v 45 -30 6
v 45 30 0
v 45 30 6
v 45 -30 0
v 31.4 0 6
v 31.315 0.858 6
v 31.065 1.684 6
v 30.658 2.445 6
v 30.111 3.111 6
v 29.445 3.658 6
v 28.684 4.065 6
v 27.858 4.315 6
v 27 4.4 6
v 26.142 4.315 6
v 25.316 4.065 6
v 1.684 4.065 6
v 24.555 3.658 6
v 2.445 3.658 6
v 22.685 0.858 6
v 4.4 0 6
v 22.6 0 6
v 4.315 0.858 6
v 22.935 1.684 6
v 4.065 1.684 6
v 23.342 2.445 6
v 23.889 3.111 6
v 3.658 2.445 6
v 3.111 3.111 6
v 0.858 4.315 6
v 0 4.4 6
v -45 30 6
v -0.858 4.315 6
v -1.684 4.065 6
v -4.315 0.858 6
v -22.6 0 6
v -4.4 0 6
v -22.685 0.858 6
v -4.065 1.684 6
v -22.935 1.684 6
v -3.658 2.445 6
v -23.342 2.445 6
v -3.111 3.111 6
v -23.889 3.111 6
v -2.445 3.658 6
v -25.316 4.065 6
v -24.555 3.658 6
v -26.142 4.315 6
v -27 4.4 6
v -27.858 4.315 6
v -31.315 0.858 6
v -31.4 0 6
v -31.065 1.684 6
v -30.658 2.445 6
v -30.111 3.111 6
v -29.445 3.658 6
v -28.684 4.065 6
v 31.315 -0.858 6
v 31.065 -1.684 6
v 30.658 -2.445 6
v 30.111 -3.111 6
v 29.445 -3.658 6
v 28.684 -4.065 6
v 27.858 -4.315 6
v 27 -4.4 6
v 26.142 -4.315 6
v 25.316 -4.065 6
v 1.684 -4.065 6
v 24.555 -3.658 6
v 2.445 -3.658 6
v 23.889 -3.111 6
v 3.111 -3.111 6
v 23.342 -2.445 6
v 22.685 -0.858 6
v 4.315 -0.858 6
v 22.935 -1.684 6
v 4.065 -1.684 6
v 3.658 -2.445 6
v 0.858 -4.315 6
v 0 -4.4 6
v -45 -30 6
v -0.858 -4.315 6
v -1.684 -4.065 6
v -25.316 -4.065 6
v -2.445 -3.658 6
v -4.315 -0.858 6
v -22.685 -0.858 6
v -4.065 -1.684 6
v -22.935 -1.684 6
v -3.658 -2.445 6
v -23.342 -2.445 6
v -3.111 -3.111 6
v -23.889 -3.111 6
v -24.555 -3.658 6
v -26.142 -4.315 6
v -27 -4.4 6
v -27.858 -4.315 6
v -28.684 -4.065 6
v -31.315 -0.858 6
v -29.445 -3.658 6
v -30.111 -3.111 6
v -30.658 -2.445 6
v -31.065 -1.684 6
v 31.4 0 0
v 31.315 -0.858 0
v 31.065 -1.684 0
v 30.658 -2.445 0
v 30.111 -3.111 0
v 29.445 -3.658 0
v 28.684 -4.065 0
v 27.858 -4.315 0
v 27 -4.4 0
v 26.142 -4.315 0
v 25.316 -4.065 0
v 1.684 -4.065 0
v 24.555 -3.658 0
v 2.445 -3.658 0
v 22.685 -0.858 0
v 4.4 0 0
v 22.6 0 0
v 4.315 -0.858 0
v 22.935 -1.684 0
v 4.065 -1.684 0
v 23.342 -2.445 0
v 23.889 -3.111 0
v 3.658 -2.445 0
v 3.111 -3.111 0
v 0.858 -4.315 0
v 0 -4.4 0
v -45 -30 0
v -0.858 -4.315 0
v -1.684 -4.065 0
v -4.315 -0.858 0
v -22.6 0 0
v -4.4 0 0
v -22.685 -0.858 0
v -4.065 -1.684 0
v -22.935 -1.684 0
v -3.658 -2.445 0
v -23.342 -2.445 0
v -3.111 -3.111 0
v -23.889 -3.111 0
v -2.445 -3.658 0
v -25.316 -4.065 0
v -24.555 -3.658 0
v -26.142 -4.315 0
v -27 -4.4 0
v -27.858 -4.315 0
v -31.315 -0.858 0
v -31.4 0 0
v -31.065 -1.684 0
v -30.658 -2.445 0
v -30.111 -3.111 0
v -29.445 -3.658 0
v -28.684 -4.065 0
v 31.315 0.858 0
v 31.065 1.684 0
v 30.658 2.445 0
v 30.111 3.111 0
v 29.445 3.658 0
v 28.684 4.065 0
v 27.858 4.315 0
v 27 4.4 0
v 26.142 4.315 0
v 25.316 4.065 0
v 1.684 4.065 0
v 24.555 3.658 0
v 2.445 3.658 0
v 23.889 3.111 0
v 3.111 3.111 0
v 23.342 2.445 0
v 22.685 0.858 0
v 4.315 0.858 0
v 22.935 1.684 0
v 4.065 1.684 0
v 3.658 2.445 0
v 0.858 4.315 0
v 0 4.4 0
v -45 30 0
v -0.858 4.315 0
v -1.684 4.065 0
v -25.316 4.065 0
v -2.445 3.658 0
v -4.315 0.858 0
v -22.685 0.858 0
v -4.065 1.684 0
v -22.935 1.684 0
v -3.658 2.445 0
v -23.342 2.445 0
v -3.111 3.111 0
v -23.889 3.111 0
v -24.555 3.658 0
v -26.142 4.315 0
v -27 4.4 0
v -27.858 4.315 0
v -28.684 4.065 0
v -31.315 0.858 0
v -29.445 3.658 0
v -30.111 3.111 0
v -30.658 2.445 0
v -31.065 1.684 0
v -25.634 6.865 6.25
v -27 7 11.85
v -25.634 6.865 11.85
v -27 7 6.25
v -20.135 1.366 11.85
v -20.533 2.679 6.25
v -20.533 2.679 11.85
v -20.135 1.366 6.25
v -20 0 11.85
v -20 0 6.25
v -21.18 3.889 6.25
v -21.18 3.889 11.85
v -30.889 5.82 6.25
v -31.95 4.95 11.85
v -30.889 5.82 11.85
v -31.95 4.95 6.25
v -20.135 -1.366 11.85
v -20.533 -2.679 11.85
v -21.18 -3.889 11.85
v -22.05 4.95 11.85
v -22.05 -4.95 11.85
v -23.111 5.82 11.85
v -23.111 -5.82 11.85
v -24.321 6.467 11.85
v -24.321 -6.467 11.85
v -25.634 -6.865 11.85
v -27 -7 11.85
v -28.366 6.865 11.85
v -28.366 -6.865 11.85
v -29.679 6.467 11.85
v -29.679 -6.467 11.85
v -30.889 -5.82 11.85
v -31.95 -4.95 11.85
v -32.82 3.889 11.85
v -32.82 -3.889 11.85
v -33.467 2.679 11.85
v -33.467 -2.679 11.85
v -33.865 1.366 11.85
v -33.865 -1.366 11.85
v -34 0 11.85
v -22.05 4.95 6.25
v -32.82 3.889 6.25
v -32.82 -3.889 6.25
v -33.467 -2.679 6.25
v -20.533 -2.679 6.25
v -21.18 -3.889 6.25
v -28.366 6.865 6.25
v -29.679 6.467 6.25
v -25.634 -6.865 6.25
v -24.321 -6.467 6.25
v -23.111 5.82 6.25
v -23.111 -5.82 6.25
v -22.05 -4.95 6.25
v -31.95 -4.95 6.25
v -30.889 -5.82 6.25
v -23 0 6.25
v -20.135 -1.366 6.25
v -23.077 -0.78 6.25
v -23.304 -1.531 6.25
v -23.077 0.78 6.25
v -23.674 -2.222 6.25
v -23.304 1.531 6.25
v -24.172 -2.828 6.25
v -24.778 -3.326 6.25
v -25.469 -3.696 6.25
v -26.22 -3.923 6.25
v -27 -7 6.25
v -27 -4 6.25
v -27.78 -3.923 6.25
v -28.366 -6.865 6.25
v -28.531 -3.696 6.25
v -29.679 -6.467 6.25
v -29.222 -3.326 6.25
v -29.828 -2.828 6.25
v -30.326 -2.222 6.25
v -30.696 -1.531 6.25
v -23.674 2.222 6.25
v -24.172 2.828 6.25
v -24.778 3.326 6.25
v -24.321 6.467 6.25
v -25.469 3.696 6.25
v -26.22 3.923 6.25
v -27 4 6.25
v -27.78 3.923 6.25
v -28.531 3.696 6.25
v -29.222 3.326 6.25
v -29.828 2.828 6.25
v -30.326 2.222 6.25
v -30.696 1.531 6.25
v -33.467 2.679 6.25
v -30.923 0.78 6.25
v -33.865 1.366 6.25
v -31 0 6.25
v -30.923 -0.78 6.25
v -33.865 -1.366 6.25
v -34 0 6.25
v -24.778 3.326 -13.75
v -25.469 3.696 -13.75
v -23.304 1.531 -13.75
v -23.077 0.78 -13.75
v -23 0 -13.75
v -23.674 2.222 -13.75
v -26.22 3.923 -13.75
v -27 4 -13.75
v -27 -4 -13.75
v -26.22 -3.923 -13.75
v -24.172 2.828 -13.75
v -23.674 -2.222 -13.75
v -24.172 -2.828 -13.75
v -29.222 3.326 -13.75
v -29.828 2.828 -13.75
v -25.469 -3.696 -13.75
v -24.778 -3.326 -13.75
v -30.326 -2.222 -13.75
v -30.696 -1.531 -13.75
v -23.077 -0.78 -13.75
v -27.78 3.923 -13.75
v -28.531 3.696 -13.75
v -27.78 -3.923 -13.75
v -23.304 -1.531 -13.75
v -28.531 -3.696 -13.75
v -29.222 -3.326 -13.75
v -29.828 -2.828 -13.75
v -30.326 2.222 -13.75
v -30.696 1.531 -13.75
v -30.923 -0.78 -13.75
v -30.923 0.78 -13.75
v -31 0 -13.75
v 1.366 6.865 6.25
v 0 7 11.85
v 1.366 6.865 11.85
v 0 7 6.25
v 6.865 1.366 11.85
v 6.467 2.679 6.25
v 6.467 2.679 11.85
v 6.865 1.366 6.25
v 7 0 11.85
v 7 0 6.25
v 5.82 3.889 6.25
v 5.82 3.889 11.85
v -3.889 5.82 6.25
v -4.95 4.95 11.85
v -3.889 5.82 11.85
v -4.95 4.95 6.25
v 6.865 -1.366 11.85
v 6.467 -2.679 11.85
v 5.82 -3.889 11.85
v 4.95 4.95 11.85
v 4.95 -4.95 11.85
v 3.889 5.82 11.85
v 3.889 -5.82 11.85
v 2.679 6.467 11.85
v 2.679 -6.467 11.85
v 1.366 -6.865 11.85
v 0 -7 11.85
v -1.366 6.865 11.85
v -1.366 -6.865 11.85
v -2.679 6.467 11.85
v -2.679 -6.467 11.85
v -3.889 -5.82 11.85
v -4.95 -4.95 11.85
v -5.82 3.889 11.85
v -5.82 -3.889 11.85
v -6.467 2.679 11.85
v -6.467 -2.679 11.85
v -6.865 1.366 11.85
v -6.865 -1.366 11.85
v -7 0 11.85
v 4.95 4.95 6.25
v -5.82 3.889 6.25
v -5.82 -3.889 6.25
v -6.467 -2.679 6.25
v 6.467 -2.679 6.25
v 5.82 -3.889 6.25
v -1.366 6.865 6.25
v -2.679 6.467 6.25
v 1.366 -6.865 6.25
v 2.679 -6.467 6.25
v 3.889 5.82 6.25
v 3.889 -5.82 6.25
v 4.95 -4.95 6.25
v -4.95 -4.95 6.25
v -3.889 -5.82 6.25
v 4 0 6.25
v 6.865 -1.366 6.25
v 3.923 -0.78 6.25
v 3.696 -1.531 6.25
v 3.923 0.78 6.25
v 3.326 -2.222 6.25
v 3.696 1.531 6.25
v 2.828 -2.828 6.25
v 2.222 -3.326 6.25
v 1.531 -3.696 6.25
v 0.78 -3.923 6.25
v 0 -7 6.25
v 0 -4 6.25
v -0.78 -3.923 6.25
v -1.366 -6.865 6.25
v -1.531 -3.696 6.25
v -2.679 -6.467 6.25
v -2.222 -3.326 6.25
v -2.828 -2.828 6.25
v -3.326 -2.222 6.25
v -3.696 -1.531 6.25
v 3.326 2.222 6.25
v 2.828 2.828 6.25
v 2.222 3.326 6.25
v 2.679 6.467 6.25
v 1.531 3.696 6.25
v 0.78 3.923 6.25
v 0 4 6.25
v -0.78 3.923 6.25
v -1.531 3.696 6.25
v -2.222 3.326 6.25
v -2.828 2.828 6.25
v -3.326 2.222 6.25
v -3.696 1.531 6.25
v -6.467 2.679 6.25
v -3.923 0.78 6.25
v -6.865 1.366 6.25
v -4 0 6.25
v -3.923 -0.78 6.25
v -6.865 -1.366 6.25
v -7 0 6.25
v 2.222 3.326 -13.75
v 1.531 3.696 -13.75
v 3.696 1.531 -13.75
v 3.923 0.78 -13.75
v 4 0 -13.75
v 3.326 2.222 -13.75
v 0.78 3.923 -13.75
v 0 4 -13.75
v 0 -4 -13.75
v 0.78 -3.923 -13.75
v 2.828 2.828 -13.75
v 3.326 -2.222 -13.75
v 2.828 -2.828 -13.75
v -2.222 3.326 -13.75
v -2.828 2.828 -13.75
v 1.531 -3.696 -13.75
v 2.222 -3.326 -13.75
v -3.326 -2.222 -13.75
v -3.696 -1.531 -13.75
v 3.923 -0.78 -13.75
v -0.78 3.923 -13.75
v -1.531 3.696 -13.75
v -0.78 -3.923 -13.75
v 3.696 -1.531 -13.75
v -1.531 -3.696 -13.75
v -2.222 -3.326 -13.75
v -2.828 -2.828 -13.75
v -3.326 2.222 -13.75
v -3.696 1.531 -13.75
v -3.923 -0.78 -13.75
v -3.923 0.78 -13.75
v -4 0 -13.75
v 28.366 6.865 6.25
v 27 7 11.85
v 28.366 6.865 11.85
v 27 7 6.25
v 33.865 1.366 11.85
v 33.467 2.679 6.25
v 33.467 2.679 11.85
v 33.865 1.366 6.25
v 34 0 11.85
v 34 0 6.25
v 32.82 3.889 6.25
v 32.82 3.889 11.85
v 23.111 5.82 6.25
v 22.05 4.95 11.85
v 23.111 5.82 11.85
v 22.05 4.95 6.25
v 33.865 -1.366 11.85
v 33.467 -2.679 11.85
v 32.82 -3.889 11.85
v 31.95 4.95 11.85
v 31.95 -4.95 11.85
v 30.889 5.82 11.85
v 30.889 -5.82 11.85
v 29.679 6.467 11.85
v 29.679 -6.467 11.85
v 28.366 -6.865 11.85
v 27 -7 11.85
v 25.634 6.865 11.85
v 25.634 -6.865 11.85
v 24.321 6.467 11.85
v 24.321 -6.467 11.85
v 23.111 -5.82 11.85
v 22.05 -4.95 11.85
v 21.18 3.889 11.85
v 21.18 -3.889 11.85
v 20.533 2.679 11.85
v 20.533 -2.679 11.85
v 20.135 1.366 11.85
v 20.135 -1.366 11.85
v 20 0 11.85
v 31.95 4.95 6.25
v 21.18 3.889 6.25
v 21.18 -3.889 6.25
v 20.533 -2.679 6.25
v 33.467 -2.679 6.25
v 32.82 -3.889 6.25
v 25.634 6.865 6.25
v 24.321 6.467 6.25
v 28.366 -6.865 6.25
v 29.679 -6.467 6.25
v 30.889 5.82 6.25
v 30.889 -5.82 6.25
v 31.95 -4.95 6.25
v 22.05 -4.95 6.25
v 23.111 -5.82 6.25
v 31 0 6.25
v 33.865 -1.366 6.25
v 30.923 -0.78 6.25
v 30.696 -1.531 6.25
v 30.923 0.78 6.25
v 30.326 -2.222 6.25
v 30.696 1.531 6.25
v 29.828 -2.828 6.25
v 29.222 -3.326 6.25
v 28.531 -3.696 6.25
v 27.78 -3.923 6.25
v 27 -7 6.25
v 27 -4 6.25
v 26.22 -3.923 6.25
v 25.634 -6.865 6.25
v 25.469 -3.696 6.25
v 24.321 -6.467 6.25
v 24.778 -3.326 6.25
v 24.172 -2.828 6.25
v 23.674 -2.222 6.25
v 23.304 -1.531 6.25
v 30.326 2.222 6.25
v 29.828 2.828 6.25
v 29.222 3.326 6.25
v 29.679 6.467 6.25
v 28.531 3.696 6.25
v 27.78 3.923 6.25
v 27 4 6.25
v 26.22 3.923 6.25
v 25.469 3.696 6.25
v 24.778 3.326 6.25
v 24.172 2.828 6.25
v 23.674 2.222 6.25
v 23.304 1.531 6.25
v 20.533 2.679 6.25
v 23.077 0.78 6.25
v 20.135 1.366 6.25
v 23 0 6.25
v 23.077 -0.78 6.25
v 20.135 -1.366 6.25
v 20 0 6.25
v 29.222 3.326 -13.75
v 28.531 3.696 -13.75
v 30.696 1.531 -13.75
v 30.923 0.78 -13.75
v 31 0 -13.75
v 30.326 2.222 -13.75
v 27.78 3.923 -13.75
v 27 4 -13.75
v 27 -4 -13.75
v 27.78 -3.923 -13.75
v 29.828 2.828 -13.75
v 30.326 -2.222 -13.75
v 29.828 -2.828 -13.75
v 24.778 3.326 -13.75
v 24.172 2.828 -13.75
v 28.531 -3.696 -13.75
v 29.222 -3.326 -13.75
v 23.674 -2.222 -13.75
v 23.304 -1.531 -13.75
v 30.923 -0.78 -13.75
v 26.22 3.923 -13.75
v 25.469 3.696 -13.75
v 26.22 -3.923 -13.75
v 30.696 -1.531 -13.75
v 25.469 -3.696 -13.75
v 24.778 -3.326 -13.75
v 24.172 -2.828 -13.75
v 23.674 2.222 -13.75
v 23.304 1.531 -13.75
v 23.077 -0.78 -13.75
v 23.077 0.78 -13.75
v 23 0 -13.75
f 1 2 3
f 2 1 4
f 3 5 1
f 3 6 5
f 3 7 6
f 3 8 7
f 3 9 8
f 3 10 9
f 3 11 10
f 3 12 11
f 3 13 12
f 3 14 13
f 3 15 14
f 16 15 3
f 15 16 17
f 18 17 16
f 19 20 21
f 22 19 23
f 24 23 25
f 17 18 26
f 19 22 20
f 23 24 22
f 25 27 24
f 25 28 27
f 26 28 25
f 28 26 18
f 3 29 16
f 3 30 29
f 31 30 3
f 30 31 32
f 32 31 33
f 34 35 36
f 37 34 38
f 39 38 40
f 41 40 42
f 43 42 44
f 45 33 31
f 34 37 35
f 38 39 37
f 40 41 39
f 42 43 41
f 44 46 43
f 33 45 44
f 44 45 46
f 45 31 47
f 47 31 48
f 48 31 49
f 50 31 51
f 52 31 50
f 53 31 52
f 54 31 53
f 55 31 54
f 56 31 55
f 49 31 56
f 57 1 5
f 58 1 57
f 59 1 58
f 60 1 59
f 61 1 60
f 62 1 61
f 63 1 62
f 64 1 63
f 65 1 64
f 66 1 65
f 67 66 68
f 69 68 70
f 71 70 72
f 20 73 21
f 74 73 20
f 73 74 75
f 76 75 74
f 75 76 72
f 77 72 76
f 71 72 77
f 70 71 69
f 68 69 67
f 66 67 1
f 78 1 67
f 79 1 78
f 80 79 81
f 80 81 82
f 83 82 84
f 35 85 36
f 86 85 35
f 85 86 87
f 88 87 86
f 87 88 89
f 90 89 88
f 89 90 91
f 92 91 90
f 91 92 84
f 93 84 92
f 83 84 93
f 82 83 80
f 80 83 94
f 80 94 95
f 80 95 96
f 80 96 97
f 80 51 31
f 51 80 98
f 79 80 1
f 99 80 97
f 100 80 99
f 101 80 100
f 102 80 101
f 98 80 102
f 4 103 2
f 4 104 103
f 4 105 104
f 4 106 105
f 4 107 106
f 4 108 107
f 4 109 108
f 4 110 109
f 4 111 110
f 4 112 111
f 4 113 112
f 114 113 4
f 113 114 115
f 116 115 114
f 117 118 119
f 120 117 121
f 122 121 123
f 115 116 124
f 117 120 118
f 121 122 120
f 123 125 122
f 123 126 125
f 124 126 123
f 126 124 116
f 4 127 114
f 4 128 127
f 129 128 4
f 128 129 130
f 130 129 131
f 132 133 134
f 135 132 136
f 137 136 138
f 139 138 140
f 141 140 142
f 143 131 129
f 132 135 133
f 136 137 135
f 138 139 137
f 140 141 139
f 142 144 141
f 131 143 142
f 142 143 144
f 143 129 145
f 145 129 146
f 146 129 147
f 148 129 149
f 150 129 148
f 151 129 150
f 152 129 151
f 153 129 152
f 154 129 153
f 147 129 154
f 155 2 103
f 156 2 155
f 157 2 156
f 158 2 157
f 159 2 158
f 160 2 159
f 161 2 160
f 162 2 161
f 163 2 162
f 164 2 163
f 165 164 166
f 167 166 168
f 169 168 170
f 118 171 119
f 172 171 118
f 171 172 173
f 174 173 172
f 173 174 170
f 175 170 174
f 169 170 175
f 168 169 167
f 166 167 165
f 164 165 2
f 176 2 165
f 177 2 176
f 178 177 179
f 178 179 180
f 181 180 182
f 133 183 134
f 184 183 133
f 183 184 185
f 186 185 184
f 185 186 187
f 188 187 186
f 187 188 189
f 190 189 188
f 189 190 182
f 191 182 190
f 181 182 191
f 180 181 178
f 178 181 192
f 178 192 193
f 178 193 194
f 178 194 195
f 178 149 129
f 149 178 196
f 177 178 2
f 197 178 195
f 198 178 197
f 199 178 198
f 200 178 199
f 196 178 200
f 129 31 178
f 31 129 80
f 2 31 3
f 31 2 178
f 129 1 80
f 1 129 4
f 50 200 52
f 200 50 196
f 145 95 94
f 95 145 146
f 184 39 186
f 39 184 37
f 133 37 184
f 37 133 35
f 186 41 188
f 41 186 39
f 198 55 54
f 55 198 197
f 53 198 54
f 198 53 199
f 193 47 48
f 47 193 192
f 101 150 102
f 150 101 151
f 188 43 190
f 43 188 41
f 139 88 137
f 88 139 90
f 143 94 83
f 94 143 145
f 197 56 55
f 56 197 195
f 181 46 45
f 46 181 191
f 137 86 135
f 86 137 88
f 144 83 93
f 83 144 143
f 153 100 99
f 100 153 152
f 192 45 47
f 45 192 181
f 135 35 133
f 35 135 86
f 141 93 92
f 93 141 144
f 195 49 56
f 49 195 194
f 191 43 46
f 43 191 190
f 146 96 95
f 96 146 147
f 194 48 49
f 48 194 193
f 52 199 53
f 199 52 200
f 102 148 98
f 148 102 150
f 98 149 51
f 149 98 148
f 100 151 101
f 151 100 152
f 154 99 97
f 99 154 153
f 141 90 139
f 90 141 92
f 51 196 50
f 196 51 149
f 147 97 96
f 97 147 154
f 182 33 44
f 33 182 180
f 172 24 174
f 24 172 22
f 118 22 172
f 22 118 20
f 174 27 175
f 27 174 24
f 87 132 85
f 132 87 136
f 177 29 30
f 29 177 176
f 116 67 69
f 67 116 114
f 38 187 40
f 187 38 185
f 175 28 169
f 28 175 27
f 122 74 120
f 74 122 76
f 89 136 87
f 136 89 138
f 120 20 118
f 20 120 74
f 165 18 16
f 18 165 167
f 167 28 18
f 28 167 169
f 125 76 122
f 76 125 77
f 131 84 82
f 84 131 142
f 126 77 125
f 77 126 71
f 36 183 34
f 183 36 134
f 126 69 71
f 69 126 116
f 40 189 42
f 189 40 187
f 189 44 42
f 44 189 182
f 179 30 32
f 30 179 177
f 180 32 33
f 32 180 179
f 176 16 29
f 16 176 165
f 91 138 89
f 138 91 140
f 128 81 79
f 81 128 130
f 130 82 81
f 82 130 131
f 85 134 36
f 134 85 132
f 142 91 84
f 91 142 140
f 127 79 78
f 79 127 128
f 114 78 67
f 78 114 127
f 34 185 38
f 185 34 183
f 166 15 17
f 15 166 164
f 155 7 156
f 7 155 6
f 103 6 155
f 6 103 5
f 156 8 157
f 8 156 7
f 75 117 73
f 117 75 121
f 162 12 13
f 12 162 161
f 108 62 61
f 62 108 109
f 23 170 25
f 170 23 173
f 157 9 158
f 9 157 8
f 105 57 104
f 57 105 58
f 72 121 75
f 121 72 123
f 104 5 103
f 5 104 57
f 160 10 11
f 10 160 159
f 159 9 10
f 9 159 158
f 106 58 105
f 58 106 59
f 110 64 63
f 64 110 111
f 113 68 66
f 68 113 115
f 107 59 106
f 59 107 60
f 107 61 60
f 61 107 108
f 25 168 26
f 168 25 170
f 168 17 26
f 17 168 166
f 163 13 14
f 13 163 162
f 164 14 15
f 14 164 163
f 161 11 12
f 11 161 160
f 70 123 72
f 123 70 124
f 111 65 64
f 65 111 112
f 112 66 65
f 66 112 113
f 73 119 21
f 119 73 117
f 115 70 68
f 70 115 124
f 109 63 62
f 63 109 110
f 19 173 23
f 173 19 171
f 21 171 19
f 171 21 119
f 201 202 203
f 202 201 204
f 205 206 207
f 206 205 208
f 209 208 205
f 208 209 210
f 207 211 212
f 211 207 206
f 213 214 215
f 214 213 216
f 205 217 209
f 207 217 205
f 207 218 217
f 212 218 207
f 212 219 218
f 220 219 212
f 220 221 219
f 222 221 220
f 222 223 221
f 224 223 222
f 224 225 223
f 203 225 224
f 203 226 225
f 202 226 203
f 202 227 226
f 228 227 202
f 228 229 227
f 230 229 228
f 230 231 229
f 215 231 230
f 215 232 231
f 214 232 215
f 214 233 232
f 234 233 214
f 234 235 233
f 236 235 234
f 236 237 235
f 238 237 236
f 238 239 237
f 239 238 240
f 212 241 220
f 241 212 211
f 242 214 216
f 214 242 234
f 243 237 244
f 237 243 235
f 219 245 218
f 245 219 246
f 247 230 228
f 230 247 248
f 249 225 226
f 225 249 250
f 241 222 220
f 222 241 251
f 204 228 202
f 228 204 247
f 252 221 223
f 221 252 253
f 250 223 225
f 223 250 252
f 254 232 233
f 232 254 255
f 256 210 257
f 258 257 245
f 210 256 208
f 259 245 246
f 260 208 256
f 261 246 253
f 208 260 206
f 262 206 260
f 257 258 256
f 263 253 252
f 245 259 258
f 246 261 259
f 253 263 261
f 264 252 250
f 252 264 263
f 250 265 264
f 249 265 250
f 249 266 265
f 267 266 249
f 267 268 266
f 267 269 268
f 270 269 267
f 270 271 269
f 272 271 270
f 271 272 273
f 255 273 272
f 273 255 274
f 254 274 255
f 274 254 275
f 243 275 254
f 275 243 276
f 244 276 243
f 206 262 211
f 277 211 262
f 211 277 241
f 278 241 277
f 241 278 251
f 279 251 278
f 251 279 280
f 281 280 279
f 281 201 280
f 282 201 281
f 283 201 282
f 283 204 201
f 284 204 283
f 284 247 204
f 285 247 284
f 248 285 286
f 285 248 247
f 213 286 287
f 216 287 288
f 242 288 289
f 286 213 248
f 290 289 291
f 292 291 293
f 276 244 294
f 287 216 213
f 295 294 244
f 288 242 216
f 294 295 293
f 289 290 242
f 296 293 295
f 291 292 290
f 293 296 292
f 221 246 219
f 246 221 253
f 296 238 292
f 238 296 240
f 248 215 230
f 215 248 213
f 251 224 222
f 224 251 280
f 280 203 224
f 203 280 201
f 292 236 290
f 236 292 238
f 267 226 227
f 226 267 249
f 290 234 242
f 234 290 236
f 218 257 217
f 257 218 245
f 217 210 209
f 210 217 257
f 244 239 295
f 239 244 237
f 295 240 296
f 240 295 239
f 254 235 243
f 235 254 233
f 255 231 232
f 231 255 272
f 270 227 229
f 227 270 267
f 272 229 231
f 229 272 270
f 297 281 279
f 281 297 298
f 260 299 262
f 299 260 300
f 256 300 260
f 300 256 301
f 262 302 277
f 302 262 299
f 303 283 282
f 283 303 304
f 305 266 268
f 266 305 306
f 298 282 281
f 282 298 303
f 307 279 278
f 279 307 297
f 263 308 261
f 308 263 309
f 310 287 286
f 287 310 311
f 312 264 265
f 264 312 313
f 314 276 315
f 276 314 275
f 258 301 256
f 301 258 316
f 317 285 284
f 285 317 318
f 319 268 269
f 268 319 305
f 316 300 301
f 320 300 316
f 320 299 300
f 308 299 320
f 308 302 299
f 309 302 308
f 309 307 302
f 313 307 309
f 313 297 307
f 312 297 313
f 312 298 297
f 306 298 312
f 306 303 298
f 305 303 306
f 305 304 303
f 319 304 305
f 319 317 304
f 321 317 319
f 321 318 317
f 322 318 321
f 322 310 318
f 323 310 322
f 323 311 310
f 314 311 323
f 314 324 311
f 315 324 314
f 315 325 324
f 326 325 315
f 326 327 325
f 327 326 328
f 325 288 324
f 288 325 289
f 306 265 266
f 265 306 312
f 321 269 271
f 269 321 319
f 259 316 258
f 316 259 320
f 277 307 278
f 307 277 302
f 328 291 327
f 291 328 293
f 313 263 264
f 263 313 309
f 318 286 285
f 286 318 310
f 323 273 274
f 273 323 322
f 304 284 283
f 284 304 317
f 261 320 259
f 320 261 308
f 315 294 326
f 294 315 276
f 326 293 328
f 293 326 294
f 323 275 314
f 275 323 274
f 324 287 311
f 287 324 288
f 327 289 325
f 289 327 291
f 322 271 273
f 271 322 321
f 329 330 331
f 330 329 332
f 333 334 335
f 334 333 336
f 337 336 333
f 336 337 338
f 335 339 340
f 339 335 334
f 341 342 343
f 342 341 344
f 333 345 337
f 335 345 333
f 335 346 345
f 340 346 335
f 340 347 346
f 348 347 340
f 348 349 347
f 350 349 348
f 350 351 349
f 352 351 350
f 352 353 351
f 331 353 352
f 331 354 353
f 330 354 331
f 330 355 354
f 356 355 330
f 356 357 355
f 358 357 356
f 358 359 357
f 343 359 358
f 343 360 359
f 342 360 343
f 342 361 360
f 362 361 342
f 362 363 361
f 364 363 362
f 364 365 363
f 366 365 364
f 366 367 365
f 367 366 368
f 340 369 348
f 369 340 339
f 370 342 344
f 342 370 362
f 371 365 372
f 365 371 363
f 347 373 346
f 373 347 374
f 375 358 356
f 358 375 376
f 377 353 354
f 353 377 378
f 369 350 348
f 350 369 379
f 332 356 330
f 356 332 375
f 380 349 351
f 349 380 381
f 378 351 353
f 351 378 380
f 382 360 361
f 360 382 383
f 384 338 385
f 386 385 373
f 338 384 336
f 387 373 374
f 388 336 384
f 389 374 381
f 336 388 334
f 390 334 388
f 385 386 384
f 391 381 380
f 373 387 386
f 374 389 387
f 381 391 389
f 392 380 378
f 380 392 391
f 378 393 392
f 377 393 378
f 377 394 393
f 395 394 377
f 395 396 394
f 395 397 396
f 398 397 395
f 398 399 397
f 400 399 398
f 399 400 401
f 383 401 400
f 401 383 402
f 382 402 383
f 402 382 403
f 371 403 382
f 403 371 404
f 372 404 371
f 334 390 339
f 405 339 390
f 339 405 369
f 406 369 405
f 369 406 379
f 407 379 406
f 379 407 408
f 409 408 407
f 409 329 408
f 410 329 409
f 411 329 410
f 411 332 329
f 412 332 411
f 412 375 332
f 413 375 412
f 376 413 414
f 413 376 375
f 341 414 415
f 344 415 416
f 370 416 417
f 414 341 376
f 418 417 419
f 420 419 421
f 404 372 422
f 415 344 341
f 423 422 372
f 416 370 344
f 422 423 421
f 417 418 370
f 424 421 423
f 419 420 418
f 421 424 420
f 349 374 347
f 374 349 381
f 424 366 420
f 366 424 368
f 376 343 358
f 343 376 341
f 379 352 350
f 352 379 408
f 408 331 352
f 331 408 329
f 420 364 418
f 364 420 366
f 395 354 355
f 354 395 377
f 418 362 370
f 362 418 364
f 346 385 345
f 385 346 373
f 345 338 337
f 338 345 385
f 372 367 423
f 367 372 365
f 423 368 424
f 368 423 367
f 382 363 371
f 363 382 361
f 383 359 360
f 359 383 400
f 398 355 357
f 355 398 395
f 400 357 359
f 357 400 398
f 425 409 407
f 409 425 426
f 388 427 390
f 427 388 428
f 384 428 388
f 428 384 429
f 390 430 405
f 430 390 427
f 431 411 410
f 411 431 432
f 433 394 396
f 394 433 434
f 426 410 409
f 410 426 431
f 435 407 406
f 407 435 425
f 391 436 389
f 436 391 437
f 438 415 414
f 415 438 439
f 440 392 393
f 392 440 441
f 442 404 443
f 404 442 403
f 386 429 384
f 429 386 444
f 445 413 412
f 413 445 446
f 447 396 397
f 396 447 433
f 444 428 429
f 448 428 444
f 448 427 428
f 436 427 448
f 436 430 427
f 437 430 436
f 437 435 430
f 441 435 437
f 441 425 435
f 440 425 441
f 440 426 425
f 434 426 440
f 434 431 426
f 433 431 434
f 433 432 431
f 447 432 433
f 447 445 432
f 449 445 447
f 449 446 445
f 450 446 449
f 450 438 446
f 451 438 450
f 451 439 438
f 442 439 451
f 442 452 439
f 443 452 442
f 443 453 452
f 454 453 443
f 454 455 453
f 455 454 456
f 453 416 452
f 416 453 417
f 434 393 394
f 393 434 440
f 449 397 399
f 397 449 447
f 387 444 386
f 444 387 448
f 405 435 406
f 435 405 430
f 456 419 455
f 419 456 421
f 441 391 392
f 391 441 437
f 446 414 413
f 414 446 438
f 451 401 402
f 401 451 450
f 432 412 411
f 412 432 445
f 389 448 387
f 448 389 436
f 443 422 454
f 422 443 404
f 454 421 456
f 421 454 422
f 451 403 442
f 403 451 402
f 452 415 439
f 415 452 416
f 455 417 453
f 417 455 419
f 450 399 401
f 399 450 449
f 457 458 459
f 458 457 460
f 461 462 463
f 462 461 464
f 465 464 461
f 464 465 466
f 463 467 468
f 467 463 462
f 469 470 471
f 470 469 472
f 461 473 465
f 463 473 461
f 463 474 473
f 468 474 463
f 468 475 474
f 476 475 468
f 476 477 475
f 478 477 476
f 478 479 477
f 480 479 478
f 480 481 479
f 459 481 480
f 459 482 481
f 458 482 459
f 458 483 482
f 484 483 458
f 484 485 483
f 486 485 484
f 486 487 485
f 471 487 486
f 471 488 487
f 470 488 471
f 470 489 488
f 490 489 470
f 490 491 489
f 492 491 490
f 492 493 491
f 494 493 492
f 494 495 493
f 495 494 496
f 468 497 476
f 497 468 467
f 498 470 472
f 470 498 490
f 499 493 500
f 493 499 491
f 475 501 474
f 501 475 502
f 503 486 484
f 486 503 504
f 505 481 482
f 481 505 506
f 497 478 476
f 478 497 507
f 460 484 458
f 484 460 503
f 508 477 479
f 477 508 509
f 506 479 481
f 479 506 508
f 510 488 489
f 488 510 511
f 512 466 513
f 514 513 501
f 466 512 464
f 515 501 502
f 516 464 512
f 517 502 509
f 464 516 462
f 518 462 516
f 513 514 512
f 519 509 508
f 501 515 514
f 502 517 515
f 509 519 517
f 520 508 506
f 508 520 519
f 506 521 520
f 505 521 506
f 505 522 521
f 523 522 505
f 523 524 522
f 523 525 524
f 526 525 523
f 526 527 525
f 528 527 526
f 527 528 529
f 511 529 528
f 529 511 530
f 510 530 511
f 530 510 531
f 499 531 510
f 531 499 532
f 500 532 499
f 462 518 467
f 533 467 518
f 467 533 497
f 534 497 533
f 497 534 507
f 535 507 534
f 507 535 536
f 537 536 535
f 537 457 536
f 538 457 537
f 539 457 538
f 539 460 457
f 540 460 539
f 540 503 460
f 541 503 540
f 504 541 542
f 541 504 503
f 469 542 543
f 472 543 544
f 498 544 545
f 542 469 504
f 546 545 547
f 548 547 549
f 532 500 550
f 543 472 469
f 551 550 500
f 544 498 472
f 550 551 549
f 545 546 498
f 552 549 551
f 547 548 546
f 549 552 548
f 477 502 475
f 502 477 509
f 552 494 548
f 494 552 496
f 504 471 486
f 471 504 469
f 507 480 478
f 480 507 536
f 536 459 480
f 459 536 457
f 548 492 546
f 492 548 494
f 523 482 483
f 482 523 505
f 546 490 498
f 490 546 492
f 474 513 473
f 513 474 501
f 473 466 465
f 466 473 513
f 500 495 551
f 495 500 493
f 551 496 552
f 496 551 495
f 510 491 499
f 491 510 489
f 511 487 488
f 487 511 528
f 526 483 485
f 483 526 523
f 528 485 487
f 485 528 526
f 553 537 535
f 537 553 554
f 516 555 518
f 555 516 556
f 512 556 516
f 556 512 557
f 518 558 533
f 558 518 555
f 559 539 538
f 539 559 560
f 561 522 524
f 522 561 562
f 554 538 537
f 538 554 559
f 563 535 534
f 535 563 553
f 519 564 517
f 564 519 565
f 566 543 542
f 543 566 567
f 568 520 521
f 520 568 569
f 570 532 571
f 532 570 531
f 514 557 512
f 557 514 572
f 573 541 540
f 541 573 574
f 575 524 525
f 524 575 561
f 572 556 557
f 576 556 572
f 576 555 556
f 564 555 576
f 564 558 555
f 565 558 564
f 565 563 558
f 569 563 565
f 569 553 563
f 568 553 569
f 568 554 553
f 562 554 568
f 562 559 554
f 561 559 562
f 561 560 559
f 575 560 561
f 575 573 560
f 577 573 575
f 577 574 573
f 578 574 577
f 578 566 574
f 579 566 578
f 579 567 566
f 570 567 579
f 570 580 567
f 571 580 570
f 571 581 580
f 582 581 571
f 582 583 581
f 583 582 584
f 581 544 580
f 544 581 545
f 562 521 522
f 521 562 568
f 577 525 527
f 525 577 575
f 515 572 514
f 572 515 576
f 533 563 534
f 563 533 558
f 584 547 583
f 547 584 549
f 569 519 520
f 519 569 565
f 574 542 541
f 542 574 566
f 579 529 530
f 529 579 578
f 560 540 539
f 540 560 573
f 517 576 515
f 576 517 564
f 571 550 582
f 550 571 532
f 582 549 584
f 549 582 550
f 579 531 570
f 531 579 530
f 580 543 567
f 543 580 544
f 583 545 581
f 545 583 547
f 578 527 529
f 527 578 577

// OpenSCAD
$fn = 32;

// ------------------------------------------------------------------------
// Bolted plate: 90 x 60 x 6 mm plate, 3 fasteners
// Every part is its own module, assembly() places them once.
// ------------------------------------------------------------------------

// --- part 1 ---
module plate() {
  difference() {
    translate([-45, -30, 0]) cube([90, 60, 6]);
    translate([-27, 0, -1]) cylinder(h = 8, d = 8.8);
    translate([0, 0, -1]) cylinder(h = 8, d = 8.8);
    translate([27, 0, -1]) cylinder(h = 8, d = 8.8);
  }
}

// --- part 2 ---
module bolt1() {
  cylinder(h = 5.6, d = 14);
  translate([0, 0, -20]) cylinder(h = 20, d = 8);
}

// --- part 3 ---
module bolt2() {
  cylinder(h = 5.6, d = 14);
  translate([0, 0, -20]) cylinder(h = 20, d = 8);
}

// --- part 4 ---
module bolt3() {
  cylinder(h = 5.6, d = 14);
  translate([0, 0, -20]) cylinder(h = 20, d = 8);
}

// --- assembly ---
module assembly() {
  translate([0, 0, 0]) rotate([0, 0, 0]) plate();
  translate([-27, 0, 6.25]) rotate([0, 0, 0]) bolt1();
  translate([0, 0, 6.25]) rotate([0, 0, 0]) bolt2();
  translate([27, 0, 6.25]) rotate([0, 0, 0]) bolt3();
}

assembly();
